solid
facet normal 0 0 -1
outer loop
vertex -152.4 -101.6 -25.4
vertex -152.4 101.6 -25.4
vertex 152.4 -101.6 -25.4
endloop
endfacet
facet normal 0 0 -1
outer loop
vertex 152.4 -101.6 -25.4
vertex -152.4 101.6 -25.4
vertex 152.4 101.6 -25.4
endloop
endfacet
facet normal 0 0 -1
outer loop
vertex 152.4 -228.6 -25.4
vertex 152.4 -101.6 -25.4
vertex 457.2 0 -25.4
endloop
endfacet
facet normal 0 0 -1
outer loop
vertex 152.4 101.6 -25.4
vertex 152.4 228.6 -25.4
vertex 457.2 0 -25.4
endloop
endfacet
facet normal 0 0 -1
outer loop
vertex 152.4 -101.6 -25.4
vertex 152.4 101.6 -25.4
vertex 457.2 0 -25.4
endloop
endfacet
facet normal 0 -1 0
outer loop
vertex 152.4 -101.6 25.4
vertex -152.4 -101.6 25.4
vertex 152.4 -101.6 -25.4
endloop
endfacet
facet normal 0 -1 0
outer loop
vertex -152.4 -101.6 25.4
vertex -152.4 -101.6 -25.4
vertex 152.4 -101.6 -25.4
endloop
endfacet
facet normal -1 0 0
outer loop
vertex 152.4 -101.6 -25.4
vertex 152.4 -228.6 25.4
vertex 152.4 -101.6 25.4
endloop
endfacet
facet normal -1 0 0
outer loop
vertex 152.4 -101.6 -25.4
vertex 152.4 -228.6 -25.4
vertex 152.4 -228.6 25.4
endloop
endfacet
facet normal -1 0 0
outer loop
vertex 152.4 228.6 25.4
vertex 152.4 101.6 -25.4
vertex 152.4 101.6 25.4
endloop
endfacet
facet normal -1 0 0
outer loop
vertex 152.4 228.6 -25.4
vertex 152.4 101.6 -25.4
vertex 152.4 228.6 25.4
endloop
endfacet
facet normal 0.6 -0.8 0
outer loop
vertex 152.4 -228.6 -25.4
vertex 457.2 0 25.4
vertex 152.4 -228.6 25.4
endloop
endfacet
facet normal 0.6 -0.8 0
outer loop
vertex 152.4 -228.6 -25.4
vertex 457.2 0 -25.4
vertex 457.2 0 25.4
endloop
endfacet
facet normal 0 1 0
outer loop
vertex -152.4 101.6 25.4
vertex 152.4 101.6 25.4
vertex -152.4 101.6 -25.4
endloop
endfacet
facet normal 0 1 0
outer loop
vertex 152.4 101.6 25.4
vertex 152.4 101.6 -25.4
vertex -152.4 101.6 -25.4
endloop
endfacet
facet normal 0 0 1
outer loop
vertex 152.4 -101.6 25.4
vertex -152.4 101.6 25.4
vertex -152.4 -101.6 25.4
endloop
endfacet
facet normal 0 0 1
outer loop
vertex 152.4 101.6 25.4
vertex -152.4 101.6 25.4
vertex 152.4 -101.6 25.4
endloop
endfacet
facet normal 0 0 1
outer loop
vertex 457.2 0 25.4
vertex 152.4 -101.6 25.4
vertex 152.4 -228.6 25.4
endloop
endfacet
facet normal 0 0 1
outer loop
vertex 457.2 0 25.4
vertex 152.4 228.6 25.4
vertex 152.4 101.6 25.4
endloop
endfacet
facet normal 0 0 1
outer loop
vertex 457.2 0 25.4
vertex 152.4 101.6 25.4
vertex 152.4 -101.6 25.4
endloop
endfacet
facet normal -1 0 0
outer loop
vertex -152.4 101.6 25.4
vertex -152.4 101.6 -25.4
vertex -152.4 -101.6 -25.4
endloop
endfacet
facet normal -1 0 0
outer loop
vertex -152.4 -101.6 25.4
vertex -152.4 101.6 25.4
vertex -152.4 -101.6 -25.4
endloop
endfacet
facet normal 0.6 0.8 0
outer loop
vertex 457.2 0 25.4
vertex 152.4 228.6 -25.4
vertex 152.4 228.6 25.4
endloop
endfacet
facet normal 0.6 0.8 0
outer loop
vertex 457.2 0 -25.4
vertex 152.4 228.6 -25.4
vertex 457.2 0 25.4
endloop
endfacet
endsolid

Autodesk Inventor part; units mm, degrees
ref_plane "YZ Plane" through (0, 0, 0) normal (1, 0, 0) x (0, 1, 0)
ref_plane "XZ Plane" through (0, 0, 0) normal (0, 1, 0) x (-1, 0, 0)
ref_plane "XY Plane" through (0, 0, 0) normal (0, 0, 1) x (1, 0, 0)
sketch "Sketch1" plane through (0, 0, 0) normal (0, 0, 1) x (1, 0, 0)
  line L0 (-152.4, -101.6) -> (152.4, -101.6)
  line L1 (152.4, -101.6) -> (152.4, 101.6)
  line L2 (152.4, 101.6) -> (-152.4, 101.6)
  line L3 (-152.4, 101.6) -> (-152.4, -101.6)
  line L4 (-152.4, -101.6) -> (152.4, 101.6) construction
  line L5 (152.4, -101.6) -> (-152.4, 101.6) construction
  line L6 (152.4, 101.6) -> (152.4, 228.6)
  line L7 (152.4, 228.6) -> (457.2, 0)
  line L8 (457.2, 0) -> (152.4, -228.6)
  line L9 (152.4, -228.6) -> (152.4, -101.6)
  point P0 (0, 0)
  dimension "d0" = 304.8
  dimension "d1" = 203.2
  dimension "d2" = 304.8
  dimension "d3" = 457.2
extrude "Extrusion1" add sketch "Sketch1" along normal mid plane 50.8
properties part number "AirFlow"
